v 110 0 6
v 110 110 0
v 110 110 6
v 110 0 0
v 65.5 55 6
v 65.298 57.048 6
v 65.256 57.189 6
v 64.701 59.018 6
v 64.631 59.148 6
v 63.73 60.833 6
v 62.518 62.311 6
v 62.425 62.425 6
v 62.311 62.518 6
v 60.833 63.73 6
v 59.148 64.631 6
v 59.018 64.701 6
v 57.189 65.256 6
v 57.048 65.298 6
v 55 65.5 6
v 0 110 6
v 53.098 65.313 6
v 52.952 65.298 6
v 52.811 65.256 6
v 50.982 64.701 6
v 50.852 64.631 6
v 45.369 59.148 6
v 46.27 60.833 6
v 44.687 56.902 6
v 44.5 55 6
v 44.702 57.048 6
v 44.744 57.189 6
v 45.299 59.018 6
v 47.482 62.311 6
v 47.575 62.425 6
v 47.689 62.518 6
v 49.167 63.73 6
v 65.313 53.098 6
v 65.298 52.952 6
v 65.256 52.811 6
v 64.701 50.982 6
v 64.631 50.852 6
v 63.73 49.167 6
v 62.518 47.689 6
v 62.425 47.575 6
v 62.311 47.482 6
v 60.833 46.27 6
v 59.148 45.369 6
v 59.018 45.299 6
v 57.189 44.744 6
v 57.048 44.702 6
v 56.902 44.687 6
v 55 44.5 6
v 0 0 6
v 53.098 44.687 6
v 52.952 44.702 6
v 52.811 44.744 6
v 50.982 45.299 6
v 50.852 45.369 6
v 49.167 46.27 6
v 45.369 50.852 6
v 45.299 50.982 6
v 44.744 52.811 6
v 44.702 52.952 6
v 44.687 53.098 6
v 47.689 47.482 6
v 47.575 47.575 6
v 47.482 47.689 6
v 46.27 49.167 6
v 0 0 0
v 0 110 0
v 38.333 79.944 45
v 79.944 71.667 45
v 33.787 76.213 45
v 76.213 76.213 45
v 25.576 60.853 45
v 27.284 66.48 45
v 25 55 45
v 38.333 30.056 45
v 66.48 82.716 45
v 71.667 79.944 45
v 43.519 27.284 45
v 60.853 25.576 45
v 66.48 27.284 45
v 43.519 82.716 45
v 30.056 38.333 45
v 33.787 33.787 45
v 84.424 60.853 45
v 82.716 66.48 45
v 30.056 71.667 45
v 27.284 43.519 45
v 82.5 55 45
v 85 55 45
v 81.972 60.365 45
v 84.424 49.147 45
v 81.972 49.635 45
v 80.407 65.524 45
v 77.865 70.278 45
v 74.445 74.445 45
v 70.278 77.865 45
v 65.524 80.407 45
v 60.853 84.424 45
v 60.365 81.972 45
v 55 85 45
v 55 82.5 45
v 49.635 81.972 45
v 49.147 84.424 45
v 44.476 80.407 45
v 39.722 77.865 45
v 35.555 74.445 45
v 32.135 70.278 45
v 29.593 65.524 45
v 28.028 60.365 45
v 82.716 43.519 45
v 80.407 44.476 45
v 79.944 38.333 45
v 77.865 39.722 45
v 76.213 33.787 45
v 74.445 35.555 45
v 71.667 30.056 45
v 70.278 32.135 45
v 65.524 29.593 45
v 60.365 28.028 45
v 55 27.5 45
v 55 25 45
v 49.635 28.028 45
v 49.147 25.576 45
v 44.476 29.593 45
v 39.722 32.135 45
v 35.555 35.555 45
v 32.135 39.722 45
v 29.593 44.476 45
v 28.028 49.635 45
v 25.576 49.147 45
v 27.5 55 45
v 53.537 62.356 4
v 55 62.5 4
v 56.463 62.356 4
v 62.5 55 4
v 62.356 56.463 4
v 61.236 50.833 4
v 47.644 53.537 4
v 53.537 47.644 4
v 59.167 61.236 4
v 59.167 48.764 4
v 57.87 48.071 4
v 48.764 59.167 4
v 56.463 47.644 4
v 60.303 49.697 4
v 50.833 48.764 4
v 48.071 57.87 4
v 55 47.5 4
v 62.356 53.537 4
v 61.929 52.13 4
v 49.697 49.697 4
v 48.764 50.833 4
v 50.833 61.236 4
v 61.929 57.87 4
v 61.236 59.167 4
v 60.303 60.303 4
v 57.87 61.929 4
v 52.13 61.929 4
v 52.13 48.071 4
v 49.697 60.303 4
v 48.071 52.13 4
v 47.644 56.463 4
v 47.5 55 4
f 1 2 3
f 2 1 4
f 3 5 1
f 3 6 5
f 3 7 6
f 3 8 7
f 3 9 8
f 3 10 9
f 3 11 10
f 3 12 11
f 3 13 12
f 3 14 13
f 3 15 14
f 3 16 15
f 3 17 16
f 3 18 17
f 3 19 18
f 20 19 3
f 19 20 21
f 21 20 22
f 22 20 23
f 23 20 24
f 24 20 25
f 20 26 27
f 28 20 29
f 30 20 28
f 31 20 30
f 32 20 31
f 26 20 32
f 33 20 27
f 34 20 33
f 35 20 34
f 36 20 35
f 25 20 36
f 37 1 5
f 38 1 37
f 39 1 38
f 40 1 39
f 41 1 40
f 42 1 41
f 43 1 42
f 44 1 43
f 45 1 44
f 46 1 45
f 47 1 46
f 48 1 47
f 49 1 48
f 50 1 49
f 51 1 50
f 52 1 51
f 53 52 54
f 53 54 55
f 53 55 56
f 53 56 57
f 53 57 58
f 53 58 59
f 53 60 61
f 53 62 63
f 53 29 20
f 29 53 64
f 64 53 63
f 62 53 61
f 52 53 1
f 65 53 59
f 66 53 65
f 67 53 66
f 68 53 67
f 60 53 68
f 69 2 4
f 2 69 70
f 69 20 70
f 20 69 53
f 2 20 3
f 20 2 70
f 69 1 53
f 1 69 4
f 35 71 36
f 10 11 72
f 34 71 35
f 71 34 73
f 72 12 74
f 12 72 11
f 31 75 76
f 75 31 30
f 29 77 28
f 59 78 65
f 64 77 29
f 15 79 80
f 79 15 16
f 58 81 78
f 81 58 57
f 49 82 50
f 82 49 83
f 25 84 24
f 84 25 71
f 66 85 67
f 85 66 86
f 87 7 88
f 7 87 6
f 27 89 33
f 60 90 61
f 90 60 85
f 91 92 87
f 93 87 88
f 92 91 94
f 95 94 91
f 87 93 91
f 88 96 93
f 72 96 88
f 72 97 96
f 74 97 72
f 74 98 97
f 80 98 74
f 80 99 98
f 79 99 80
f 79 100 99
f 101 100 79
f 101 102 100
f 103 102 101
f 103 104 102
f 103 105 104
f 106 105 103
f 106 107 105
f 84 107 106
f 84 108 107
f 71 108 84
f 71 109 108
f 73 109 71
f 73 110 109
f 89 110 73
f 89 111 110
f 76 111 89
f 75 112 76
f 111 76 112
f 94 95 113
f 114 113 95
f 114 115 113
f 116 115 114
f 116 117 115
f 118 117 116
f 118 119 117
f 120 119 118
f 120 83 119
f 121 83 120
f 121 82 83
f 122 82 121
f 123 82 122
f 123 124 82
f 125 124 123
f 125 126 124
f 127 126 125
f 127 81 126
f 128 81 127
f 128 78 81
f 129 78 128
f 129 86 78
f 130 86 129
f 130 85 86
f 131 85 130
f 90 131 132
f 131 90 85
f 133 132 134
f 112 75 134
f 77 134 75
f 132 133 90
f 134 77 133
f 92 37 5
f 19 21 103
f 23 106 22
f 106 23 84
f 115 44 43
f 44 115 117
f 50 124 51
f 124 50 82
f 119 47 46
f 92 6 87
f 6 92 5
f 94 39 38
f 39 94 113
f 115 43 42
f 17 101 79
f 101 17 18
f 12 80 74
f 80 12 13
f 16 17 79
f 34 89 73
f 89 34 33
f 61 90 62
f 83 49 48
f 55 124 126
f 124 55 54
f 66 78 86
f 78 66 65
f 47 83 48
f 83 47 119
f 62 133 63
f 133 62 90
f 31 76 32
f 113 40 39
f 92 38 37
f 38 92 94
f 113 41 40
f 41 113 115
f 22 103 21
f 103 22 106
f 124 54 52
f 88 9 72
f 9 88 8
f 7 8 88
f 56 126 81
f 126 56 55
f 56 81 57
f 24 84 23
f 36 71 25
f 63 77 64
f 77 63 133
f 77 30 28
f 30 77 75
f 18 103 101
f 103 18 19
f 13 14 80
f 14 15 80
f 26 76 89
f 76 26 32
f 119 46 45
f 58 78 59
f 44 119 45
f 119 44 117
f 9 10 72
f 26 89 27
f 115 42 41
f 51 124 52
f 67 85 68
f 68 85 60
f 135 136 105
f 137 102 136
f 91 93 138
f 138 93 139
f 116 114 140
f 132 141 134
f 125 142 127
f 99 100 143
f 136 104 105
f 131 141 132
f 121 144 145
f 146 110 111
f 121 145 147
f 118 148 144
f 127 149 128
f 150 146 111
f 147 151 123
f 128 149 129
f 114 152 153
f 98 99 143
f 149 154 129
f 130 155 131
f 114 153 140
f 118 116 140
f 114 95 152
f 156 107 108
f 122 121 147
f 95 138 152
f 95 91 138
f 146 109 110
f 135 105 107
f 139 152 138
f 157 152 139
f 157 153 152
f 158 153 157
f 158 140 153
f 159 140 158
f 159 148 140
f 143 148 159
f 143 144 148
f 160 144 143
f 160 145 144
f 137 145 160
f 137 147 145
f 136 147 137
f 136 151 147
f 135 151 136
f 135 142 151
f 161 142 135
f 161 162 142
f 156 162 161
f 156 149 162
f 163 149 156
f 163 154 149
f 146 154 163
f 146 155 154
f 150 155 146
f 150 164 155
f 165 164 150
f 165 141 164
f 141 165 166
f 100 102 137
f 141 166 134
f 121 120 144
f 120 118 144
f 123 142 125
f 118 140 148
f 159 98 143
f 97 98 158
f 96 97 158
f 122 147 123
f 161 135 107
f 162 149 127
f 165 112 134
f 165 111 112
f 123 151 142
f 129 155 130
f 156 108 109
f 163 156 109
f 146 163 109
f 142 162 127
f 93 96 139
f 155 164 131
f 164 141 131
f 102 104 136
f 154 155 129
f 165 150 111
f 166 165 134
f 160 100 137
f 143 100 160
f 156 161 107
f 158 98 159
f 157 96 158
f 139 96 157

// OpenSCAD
$fn = 32;

// ----------------------------------------------------------------------
// Hopper: funnel with square flange
// ----------------------------------------------------------------------

// --- parameters (mm) ---
fl = 110;                 // flange side, X and Y
fl_t = 6;                 // flange thickness
cone_h = 40;              // cone height above the flange
top_d = 60;               // cone mouth diameter
bot_d = 20;               // cone spout diameter
wall = 2.5;               // cone wall thickness

bore_d = bot_d - 2 * wall;  // spout bore diameter
total_h = fl_t + cone_h - 1;  // overall height

difference() {
  union() {
    cube([fl, fl, fl_t]);
    translate([fl / 2, fl / 2, fl_t - 1])
      cylinder(h = cone_h, d1 = bot_d, d2 = top_d);
  }
  translate([fl / 2, fl / 2, fl_t - 2])
    cylinder(h = cone_h + 1, d1 = bore_d, d2 = top_d - 2 * wall);
}
